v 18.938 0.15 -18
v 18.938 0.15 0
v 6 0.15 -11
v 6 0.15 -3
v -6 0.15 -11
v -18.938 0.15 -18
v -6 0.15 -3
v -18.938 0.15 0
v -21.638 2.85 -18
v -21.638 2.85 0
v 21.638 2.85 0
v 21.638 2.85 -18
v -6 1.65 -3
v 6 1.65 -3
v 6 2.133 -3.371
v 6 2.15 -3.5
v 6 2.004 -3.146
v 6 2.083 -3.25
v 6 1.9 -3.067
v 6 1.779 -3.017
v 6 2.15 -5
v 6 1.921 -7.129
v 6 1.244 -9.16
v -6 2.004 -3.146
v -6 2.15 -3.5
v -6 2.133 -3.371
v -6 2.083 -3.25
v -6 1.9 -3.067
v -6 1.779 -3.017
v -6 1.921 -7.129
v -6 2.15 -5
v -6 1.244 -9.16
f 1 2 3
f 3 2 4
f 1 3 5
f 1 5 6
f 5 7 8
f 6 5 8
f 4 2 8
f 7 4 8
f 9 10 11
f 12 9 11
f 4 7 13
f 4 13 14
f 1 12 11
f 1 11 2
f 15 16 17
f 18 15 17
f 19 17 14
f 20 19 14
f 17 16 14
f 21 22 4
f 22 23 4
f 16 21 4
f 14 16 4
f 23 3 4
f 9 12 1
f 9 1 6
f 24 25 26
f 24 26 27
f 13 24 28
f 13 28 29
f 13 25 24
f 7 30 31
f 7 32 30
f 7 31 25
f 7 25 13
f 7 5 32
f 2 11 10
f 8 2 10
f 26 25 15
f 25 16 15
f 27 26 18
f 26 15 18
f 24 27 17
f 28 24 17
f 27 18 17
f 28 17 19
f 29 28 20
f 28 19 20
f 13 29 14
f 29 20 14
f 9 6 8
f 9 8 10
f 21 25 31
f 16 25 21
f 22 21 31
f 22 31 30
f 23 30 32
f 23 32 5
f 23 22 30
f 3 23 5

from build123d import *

# Parameters (mm, degrees)
BOSS_EXTRUDE1_DEPTH = 18
SKETCH4_W           = 12
SKETCH4_H           = 8
CUT_EXTRUDE1_DEPTH  = 2
FILLET1_R           = 10
FILLET2_R           = 0.5


with BuildPart() as part:
    # Sketch2 → Boss-Extrude1 (new body)
    with BuildSketch(Plane.XY):
        Polygon((21.637867966, 2.85), (18.937867966, 0.15), (-18.937867966, 0.15), (-21.637867966, 2.85), align=None)
    extrude(amount=-BOSS_EXTRUDE1_DEPTH)

    # Sketch4 → Cut-Extrude1 (cut)
    with BuildSketch(Plane.XZ.offset(-0.15)):
        with Locations((0, -7)):
            Rectangle(SKETCH4_W, SKETCH4_H)
    extrude(amount=-CUT_EXTRUDE1_DEPTH, mode=Mode.SUBTRACT)

    # Fillet1
    # the kernel refuses this fillet: 10 mm, written as the material it adds along each edge
    with BuildSketch(Plane(origin=(6, 2.15, -11), x_dir=(0, -1, 0), z_dir=(-1, 0, 0))) as fillet1_piece_1:
        with BuildLine():
            CenterArc((10, 6), FILLET1_R, 180, 36.869897646)
            Line((0, 6), (0, 0))
            Line((0, 0), (2, 0))
        make_face()
    extrude(amount=12)

    # Fillet2
    fillet2_edges = [part.edges().sort_by_distance(p)[0] for p in [
        (0, 2.15, -3),
    ]]
    fillet(fillet2_edges, radius=FILLET2_R)


solid = part.part
